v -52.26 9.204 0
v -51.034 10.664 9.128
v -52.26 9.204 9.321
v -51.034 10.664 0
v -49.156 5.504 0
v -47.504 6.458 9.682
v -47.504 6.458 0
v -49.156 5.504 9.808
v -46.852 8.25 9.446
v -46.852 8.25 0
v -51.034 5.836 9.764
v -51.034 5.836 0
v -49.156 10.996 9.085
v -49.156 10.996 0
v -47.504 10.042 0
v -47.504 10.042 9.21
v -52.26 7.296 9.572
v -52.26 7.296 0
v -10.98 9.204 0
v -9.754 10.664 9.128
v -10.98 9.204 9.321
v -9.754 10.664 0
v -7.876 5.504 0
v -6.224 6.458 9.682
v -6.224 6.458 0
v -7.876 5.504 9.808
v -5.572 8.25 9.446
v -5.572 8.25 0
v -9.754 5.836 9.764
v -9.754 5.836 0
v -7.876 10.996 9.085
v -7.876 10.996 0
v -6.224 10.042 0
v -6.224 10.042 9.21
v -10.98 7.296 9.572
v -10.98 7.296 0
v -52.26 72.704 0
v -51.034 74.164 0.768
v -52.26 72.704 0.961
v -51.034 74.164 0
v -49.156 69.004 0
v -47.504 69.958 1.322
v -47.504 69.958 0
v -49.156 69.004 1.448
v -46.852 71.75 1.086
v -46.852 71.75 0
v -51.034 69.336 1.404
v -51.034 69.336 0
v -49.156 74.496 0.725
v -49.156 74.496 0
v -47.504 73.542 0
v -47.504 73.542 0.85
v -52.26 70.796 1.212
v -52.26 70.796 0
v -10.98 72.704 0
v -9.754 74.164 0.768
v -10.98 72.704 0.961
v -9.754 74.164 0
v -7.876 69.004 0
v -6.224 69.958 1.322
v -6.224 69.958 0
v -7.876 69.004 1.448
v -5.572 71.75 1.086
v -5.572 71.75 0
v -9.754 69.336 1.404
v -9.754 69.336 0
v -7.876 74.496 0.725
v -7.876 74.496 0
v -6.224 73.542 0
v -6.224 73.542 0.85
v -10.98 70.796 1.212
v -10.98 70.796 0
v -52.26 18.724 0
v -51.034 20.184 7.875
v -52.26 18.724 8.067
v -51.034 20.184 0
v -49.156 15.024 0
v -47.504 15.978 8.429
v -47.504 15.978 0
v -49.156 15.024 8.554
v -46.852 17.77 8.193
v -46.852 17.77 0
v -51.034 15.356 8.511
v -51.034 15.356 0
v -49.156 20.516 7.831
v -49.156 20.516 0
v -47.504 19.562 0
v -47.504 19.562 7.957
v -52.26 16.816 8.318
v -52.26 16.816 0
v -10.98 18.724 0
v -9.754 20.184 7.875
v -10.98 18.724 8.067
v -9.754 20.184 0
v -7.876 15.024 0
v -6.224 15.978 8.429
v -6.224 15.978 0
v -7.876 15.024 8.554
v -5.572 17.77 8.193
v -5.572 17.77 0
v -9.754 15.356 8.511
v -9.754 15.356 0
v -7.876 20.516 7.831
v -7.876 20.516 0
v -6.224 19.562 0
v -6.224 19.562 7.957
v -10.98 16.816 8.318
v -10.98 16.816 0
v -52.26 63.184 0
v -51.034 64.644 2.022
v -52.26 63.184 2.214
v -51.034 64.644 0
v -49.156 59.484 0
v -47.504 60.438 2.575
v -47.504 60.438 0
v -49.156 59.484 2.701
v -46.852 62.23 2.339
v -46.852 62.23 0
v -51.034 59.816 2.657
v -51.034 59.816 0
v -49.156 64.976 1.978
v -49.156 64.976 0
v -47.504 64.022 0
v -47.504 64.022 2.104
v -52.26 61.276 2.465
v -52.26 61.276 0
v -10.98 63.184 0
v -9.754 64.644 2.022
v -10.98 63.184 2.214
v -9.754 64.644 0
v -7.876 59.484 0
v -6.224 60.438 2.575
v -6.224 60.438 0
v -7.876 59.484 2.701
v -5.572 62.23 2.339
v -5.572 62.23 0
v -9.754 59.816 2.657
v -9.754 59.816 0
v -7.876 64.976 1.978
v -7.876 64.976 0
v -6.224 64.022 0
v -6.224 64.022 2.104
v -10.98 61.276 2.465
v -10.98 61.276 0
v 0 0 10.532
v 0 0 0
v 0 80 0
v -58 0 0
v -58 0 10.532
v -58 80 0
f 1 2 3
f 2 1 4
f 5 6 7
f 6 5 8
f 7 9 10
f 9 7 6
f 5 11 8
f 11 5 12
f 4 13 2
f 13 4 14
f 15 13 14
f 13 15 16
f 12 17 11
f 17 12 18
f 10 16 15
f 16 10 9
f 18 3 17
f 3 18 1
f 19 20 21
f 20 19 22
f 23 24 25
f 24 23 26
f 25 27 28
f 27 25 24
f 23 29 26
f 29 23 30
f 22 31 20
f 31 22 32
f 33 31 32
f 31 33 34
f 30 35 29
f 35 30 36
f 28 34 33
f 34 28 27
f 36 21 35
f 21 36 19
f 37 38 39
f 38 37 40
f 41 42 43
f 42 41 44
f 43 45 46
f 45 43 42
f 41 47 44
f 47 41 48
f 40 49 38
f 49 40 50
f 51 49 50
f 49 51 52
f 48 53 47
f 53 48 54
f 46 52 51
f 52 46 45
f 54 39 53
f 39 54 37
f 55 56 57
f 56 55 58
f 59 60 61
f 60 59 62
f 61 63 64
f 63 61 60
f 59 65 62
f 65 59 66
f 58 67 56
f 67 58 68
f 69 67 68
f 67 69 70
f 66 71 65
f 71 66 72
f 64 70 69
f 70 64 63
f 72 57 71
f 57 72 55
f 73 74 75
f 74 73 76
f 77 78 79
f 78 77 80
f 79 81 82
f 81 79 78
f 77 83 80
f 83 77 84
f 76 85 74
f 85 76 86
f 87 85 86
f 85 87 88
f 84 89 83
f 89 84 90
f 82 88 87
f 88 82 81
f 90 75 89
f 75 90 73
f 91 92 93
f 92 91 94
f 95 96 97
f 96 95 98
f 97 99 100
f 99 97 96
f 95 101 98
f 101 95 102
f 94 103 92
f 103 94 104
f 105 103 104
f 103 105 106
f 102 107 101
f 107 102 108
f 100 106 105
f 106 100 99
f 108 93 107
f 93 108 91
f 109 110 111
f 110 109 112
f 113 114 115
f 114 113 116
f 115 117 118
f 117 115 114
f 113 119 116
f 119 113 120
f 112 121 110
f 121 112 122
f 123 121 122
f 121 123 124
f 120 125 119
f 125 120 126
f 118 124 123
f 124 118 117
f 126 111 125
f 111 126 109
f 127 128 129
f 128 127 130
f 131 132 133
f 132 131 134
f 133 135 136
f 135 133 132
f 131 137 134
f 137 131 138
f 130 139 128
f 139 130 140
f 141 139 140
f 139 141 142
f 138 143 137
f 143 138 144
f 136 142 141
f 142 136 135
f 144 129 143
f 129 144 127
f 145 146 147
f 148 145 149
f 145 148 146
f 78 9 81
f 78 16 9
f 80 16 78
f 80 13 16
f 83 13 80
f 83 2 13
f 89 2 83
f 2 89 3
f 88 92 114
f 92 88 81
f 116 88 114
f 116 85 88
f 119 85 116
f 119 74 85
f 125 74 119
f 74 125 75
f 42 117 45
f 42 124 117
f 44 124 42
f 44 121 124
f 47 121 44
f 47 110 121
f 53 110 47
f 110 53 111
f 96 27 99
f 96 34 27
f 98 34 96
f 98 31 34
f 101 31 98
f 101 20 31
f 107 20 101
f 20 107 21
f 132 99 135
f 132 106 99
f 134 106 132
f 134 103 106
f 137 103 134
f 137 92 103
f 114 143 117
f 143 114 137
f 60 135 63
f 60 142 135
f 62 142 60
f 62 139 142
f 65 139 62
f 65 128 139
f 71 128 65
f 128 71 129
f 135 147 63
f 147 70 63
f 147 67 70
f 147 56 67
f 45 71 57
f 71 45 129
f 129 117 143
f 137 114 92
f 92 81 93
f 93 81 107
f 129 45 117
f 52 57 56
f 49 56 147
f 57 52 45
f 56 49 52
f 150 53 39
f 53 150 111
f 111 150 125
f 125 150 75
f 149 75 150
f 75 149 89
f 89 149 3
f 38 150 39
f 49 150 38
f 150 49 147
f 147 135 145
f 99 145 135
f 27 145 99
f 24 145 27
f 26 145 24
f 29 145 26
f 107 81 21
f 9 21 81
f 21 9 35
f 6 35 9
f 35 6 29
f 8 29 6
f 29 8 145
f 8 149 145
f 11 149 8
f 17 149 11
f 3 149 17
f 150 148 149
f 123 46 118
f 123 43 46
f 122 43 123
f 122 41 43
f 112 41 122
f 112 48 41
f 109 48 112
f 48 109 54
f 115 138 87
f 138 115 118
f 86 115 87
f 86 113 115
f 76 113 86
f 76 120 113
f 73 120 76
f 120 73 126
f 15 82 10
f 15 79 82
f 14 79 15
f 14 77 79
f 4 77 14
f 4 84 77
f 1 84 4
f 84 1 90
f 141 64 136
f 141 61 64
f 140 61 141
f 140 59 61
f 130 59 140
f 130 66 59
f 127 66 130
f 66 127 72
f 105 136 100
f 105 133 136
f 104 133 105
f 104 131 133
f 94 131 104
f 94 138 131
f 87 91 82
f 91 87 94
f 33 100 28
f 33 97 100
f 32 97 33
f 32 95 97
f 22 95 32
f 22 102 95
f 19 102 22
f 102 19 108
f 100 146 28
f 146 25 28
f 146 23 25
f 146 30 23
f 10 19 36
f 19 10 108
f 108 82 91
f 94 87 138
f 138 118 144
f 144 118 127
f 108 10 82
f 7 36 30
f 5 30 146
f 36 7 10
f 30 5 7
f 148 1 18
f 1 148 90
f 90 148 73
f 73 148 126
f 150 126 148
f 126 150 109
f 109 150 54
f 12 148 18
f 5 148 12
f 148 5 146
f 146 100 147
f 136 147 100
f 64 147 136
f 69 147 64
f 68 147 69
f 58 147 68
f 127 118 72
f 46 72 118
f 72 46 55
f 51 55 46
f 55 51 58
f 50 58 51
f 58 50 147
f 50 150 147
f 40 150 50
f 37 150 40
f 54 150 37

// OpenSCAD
// [FL_INDEX: keywords="openscad, 3d_parametric, Customizer_Skateboard_Truck_Wedge, csg_solid" | COT="Parametric OpenSCAD design from 3DCodeverse"]
// Title: Customizer Skateboard Truck Wedge

// This makes the holes bigger.
tolerance = .3;
// This determines how thick the base of the riser will be in mm.
rise = 0; // [0:100]
// This Determines the angle of the wedge, between 0 and 45 degrees. Dont forget you can stack these too!
angle = 7.5; // [0:45]

// Copyright 2010 D1plo1d

// This library is dual licensed under the GPL 3.0 and the GNU Lesser General Public License as per http://creativecommons.org/licenses/LGPL/2.1/ .

//testNutsAndBolts();

module SKIPtestNutsAndBolts()
{
	$fn = 360;
	translate([0,15])nutHole(3, proj=2);
	boltHole(3, length= 30, proj=2);
}

MM = "mm";
INCH = "inch"; //Not yet supported

//Based on: http://www.roymech.co.uk/Useful_Tables/Screws/Hex_Screws.htm
METRIC_NUT_AC_WIDTHS =
[
	-1, //0 index is not used but reduces computation
	-1,
	-1,
	6.40,//m3
	8.10,//m4
	9.20,//m5
	11.50,//m6
	-1,
	15.00,//m8
	-1,
	19.60,//m10
	-1,
	22.10,//m12
	-1,
	-1,
	-1,
	27.70,//m16
	-1,
	-1,
	-1,
	34.60,//m20
	-1,
	-1,
	-1,
	41.60,//m24
	-1,
	-1,
	-1,
	-1,
	-1,
	53.1,//m30
	-1,
	-1,
	-1,
	-1,
	-1,
	63.5//m36
];
METRIC_NUT_THICKNESS =
[
	-1, //0 index is not used but reduces computation
	-1,
	-1,
	2.40,//m3
	3.20,//m4
	4.00,//m5
	5.00,//m6
	-1,
	6.50,//m8
	-1,
	8.00,//m10
	-1,
	10.00,//m12
	-1,
	-1,
	-1,
	13.00,//m16
	-1,
	-1,
	-1,
	16.00//m20
	-1,
	-1,
	-1,
	19.00,//m24
	-1,
	-1,
	-1,
	-1,
	-1,
	24.00,//m30
	-1,
	-1,
	-1,
	-1,
	-1,
	29.00//m36
];

COURSE_METRIC_BOLT_MAJOR_THREAD_DIAMETERS =
[//based on max values
	-1, //0 index is not used but reduces computation
	-1,
	-1,
	2.98,//m3
	3.978,//m4
	4.976,//m5
	5.974,//m6
	-1,
	7.972,//m8
	-1,
	9.968,//m10
	-1,
	11.966,//m12
	-1,
	-1,
	-1,
	15.962,//m16
	-1,
	-1,
	-1,
	19.958,//m20
	-1,
	-1,
	-1,
	23.952,//m24
	-1,
	-1,
	-1,
	-1,
	-1,
	29.947,//m30
	-1,
	-1,
	-1,
	-1,
	-1,
	35.940//m36
];

module nutHole(size, units=MM, tolerance = +0.0001, proj = -1)
{
	//takes a metric screw/nut size and looksup nut dimensions
	radius = METRIC_NUT_AC_WIDTHS[size]/2+tolerance;
	height = METRIC_NUT_THICKNESS[size]+tolerance;
	if (proj == -1)
	{
		cylinder(r= radius, h=height, $fn = 6, center=[0,0]);
	}
	if (proj == 1)
	{
		circle(r= radius, $fn = 6);
	}
	if (proj == 2)
	{
		translate([-radius/2, 0])
			square([radius*2, height]);
	}
}

module boltHole(size, units=MM, length, tolerance = +0.0001, proj = -1)
{
	radius = COURSE_METRIC_BOLT_MAJOR_THREAD_DIAMETERS[size]/2+tolerance;
//TODO: proper screw cap values
	capHeight = METRIC_NUT_THICKNESS[size]+tolerance; //METRIC_BOLT_CAP_HEIGHTS[size]+tolerance;
	capRadius = METRIC_NUT_AC_WIDTHS[size]/2+tolerance; //METRIC_BOLT_CAP_RADIUS[size]+tolerance;

	if (proj == -1)
	{
	translate([0, 0, -capHeight])
		cylinder(r= capRadius, h=capHeight);
	cylinder(r = radius, h = length);
	}
	if (proj == 1)
	{
		circle(r = radius);
	}
	if (proj == 2)
	{
		translate([-capRadius/2, -capHeight])
			square([capRadius*2, capHeight]);
		square([radius*2, length]);
	}
}



/* length, width of wedge
    height of side 1 and 2 
    drill oldschool and/or newschool pattern 
    bolt size (M)

    NOTE: if both oldschool and newschool bits are set to 1, 
    the newschool pattern will be displaced to match on one side.
*/
module wedge(len, wid, hei1, hei2, oldschool, newschool, bolt, angle1, derpschool) {

len = 80;
bolt_wid = 41.28;
new_len = 53.98;
old_len = 63.5;
angle1 = angle;
hei1 = tan(angle1)*len+rise;
hei2 = rise;

mx = len/2;
my = wid/2;

difference() {
  rotate([0,-90,0])
  linear_extrude(height=wid)
    polygon (points = [[0,0],[0,len],[hei2,len],[hei1,0]]);


/* for sunken holes you'll never need, 
   translate z by 
                     hei1 + (hei2-hei1)/len * (mx + x*mx*3/4) -0.5
*/

if (oldschool==1) {
  for (x = [-1,1])
  for (y = [-1,1]) 
  translate([-my + y * bolt_wid/2, mx + x * old_len/2, hei1+hei2 ])
  rotate([180,0,0])
  boltHole(bolt, length=hei1+hei2+0.1, tolerance=tolerance, 2);
}

if (newschool==1) {
  for (x = [-1,1])
  for (y = [-1,1]) 
  translate([-my + y * bolt_wid/2, mx + x * new_len/2 +(old_len-new_len)/2 * oldschool, hei1+hei2])
  rotate([180,0,0])
  boltHole(bolt, length=hei1+hei2+0.1, tolerance=tolerance, 2);
}
if (newschool==1) {
  for (x = [-1,1])
  for (y = [-1,1]) 
  translate([-my + y * bolt_wid/2, mx + x * new_len/2 -(old_len-new_len)/2 * oldschool, hei1+hei2])
  rotate([180,0,0])
  boltHole(bolt, length=hei1+hei2+0.1, tolerance=tolerance, 2);
}
}
}

/* example */
wedge (90, 58, 15, 10, 1, 1, 5);
/**/
